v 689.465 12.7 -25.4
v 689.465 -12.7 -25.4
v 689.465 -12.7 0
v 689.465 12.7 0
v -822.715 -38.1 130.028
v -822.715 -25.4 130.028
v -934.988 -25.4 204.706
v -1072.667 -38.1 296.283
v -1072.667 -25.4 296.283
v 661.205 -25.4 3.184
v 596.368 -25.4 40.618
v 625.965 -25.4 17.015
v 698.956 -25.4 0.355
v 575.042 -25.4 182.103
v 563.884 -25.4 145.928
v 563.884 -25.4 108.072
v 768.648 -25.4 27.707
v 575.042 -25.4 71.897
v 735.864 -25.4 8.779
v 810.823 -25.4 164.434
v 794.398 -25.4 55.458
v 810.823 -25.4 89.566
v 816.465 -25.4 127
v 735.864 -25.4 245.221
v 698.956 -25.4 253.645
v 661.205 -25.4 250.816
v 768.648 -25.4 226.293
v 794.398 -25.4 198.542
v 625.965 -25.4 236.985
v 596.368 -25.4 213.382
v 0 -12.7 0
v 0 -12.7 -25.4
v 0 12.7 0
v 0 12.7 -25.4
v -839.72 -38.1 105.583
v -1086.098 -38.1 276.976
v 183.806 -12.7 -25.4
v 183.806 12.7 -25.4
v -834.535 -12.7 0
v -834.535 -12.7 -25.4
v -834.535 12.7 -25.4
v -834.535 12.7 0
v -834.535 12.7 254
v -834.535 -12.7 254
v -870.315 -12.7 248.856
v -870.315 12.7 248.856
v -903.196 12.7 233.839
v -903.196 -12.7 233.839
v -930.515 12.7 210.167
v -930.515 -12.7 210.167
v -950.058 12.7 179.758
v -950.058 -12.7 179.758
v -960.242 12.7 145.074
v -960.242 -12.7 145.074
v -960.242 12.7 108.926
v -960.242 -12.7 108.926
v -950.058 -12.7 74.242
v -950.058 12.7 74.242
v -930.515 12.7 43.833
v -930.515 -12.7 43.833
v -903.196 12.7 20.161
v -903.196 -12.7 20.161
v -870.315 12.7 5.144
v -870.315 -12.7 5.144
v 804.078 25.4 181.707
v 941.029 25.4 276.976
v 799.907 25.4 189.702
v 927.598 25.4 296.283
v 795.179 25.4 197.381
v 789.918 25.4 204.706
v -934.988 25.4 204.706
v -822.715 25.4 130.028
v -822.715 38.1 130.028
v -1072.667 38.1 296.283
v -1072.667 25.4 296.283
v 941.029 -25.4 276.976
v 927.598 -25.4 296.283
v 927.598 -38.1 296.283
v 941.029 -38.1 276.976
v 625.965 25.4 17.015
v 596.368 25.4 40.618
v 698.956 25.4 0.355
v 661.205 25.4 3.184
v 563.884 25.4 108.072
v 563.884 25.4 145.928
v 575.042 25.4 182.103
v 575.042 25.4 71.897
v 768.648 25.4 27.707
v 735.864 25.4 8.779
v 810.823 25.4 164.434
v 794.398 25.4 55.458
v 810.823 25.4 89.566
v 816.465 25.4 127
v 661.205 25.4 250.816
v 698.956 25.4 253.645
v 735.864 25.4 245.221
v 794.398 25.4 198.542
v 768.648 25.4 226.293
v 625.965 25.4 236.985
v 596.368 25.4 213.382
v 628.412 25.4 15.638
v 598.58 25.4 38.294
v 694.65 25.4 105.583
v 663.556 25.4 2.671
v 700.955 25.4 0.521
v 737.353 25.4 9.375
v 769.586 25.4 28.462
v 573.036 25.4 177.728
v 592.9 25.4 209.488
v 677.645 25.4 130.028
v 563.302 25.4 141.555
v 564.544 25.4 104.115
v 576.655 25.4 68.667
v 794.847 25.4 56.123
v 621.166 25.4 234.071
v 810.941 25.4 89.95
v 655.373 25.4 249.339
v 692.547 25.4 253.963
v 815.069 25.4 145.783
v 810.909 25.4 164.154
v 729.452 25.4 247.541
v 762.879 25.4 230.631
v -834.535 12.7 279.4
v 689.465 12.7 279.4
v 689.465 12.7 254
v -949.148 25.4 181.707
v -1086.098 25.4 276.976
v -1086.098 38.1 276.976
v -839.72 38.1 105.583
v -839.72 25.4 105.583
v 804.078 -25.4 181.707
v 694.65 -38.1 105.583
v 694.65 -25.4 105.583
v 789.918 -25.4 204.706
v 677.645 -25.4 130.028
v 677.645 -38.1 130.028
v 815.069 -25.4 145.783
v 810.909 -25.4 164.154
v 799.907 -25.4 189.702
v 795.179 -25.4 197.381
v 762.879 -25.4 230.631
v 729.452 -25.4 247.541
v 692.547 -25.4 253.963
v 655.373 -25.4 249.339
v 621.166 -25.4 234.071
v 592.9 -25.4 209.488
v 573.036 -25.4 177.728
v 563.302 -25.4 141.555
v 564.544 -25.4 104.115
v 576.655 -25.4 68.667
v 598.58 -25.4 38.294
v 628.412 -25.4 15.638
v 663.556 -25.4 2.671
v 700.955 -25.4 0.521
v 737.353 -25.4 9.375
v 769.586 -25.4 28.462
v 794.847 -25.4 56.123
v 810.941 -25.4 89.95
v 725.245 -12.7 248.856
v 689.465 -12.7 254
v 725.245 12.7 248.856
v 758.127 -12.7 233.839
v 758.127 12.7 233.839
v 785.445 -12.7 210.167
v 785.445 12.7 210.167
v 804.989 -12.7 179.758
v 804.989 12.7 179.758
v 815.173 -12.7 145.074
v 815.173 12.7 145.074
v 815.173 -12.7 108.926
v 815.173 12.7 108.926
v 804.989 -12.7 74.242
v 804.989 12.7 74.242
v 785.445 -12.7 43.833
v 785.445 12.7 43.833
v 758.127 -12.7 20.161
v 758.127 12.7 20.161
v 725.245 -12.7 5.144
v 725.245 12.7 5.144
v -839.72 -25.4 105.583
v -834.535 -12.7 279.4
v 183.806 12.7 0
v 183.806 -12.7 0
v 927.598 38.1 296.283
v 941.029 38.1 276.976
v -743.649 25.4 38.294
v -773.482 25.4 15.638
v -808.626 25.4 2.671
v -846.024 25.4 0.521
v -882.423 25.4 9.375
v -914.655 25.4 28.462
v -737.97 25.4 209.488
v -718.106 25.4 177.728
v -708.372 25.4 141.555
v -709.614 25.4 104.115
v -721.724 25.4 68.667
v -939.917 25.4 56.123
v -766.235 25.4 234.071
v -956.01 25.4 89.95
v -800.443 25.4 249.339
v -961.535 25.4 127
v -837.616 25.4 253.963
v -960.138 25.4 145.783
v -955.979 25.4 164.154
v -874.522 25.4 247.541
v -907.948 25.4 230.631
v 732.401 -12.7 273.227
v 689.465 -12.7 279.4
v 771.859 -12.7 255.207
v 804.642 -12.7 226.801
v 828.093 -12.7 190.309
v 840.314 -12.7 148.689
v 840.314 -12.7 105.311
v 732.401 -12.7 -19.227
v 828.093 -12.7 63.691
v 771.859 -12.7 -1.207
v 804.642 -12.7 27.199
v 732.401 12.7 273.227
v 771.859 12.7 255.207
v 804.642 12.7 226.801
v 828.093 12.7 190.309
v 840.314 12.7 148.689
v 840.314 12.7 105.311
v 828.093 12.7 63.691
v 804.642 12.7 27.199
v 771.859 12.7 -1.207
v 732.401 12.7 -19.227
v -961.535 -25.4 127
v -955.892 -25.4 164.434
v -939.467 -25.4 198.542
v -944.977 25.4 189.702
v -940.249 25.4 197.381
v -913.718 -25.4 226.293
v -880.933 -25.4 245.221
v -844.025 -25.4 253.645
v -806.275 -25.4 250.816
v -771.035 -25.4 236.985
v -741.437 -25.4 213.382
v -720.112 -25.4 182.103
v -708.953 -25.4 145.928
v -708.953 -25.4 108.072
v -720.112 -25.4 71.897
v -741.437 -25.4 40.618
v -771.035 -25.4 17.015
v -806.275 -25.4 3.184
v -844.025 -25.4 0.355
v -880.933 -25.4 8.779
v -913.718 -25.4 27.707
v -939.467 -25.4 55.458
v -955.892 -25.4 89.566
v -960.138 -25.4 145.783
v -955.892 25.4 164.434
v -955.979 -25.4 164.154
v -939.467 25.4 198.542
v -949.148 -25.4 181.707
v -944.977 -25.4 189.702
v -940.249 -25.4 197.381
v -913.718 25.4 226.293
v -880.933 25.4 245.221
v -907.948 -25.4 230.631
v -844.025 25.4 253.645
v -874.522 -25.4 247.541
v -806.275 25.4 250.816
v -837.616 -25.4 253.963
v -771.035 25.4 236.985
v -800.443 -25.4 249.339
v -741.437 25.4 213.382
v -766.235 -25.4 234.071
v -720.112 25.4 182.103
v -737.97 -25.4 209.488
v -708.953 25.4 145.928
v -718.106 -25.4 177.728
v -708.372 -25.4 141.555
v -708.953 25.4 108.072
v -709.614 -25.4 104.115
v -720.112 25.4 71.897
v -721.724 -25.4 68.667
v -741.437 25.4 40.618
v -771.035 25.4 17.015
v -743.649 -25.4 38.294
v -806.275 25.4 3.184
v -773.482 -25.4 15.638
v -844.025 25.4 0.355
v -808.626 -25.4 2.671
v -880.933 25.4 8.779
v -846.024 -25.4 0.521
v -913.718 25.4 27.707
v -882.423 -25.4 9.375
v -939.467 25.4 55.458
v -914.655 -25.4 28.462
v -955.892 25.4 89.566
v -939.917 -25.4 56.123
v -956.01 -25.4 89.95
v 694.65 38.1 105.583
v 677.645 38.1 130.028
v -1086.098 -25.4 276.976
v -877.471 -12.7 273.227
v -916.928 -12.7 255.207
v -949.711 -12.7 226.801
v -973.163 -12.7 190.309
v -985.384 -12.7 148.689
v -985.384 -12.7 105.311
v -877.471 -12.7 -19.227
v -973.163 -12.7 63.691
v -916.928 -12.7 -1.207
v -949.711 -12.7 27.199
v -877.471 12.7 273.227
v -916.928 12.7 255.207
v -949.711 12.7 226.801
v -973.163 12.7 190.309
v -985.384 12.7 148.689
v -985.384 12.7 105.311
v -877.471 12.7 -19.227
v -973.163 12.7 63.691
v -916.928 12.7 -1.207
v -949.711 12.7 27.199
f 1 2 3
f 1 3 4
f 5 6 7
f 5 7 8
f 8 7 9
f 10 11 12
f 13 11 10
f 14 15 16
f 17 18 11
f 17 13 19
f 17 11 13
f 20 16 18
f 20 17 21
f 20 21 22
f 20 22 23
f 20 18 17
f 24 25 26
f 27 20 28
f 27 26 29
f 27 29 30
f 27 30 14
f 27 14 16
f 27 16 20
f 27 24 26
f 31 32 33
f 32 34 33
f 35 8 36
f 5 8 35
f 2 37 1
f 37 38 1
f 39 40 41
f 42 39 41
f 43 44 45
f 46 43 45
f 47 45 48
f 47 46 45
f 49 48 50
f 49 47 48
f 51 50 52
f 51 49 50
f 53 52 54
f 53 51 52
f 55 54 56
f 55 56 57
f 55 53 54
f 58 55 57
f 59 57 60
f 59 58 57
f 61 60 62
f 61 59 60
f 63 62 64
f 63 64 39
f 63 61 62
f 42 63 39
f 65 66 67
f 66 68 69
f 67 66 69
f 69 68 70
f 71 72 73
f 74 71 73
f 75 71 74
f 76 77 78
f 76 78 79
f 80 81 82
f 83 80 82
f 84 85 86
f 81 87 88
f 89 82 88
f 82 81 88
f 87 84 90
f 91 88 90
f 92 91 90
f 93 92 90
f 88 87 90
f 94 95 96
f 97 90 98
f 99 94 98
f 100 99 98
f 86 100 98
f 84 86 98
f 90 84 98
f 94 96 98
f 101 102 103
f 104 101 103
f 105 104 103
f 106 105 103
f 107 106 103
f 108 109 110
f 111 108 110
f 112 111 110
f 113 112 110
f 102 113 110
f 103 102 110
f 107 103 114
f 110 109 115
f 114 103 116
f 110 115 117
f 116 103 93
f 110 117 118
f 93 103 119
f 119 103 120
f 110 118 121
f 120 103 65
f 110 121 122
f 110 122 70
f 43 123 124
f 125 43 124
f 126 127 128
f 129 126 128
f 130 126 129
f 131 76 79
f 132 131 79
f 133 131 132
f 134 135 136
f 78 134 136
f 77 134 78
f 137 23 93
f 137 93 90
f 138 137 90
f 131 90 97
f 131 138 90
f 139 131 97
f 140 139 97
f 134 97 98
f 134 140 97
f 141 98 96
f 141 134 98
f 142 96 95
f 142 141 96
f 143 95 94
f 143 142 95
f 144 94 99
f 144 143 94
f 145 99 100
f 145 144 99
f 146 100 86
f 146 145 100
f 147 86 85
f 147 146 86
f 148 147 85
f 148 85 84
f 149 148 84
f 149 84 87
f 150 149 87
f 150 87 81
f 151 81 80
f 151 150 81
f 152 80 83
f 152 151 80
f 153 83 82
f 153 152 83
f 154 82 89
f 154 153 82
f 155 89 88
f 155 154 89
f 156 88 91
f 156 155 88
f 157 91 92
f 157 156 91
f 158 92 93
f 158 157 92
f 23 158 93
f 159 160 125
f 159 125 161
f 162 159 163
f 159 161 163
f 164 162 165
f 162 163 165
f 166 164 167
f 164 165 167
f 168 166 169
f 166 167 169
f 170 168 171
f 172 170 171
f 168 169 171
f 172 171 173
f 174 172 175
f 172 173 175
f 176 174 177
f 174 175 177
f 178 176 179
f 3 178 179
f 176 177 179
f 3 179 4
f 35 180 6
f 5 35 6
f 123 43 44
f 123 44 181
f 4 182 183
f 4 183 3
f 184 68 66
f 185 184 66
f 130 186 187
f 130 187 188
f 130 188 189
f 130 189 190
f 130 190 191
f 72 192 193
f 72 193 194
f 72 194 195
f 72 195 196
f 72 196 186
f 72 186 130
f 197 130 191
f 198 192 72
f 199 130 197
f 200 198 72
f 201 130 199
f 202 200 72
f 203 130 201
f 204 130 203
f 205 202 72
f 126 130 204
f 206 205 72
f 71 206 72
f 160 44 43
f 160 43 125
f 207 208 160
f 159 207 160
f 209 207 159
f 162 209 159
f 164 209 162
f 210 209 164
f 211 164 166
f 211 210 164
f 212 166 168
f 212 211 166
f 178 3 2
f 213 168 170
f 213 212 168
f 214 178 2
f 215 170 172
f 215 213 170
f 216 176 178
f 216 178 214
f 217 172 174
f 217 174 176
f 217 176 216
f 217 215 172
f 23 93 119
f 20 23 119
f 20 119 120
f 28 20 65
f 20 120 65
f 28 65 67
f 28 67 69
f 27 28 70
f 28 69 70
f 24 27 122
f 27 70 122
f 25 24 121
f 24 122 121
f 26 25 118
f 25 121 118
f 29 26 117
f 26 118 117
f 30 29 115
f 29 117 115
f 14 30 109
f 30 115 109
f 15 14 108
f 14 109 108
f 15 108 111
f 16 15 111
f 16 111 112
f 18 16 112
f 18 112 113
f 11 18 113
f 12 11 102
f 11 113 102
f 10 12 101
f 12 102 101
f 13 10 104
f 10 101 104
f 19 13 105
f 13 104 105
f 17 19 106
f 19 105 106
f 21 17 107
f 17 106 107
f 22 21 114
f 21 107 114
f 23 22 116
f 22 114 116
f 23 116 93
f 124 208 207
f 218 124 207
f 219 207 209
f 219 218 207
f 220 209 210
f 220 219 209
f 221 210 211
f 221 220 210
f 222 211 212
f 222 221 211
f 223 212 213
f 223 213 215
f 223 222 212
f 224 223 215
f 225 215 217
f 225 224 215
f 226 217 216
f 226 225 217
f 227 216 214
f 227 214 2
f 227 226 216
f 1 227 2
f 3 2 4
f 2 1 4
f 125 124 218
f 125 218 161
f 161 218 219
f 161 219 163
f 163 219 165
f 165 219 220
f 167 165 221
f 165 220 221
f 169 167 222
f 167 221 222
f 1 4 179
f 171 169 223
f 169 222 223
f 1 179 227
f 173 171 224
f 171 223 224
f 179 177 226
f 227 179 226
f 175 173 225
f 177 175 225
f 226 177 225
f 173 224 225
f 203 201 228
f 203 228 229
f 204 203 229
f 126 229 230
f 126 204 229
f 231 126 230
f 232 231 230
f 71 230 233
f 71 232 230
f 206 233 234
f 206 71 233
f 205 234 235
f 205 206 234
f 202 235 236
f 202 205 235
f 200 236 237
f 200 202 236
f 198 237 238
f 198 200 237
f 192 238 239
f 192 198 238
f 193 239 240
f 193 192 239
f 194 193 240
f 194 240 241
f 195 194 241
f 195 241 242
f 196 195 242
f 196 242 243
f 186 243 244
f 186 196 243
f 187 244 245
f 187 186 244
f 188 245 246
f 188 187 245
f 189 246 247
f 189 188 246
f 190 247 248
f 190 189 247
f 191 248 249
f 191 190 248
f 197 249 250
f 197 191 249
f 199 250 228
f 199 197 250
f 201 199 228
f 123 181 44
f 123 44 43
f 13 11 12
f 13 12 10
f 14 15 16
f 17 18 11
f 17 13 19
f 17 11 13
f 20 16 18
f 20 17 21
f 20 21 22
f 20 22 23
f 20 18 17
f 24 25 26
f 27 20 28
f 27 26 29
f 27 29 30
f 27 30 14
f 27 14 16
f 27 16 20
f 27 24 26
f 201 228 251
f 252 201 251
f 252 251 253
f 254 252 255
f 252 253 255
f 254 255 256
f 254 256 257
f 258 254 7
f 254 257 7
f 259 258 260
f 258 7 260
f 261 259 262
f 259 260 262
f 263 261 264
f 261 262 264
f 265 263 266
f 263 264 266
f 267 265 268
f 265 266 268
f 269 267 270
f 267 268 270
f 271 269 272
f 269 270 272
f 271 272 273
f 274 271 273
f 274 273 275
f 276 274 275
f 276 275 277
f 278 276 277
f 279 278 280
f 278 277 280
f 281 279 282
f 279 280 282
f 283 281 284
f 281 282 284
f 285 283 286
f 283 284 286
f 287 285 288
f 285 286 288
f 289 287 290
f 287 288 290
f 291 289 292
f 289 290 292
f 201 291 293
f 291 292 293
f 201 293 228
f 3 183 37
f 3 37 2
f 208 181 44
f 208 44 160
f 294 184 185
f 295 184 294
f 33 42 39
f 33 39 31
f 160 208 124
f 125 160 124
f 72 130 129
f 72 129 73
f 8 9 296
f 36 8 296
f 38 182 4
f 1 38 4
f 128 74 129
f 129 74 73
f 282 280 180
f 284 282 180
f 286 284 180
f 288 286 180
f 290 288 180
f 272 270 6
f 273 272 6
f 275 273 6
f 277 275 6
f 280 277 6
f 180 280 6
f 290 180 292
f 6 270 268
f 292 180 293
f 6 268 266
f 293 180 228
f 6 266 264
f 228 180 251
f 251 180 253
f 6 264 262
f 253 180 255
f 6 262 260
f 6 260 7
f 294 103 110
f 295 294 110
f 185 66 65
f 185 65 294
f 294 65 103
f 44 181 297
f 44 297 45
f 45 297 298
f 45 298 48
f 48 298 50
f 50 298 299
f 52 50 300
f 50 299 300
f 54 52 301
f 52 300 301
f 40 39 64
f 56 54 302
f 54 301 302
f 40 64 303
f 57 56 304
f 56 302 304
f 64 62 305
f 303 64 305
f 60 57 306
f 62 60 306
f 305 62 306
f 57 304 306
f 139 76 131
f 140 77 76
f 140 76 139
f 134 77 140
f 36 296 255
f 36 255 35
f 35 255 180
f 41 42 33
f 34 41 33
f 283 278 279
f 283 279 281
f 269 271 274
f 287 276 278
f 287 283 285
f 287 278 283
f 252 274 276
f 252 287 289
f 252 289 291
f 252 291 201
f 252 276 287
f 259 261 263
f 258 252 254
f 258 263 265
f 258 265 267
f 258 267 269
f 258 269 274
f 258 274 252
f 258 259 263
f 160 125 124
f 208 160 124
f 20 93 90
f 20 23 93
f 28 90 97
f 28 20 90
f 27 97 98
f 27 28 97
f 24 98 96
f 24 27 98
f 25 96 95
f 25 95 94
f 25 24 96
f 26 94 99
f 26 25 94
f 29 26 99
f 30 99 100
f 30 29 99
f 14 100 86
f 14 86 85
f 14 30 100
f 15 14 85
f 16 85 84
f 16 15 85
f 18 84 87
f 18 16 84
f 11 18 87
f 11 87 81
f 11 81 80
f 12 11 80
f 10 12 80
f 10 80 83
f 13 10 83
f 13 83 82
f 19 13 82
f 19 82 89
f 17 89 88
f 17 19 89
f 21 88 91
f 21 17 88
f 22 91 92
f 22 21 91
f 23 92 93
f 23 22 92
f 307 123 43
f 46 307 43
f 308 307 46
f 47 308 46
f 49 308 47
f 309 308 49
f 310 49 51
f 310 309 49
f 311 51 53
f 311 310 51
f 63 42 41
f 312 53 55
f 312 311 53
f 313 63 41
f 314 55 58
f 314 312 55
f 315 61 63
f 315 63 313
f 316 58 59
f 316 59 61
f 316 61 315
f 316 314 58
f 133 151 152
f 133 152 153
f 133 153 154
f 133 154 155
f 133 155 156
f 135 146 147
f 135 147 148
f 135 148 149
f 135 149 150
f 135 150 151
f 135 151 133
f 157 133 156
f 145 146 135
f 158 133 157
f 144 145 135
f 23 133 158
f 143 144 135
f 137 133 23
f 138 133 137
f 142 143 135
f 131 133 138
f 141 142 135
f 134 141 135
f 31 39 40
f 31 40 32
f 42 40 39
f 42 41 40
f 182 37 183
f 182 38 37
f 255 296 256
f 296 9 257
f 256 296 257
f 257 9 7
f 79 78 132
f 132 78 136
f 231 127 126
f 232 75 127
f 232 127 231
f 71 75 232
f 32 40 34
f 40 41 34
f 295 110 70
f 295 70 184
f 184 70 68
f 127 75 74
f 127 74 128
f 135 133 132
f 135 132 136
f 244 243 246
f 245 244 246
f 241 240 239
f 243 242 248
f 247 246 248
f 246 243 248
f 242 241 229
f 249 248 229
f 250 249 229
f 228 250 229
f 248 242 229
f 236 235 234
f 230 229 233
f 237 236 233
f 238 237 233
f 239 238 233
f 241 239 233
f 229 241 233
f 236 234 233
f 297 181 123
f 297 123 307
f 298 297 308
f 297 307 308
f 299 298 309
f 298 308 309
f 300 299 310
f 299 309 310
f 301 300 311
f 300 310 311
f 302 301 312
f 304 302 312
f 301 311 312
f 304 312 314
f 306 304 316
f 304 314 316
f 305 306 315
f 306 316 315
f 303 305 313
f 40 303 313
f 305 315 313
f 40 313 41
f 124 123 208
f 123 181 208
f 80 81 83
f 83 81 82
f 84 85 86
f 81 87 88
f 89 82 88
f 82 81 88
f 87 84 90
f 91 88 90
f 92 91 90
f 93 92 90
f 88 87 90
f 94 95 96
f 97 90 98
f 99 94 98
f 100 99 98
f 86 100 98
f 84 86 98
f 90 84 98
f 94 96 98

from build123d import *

# Parameters (mm, degrees)
F0_W     = 834.534724
F0_H     = 25.4
F0_W_2   = 505.659487
F0_W_3   = 1524
F1_DEPTH = 12.7
F2_R     = 127
F3_DEPTH = 25.4
F4_W     = 25.4
F4_H     = 25.4
F5_ANGLE = 180
F9_DEPTH = 12.7


with BuildPart() as f1:
    # F0 (on Front) → F1 (new body, symmetric)
    with BuildSketch(Plane.XZ):
        with Locations((-417.267362, -12.7)):
            Rectangle(F0_W, F0_H)
        with Locations((436.635533, -12.7)):
            Rectangle(F0_W_2, F0_H)
        with Locations((-72.534724, 266.7)):
            Rectangle(F0_W_3, F0_H)
    extrude(amount=F1_DEPTH, both=True)


with BuildPart() as f3:
    # F2 (on Front) → F3 (new body, symmetric)
    with BuildSketch(Plane.XZ):
        with Locations((689.465276, 127)):
            Circle(F2_R)
    extrude(amount=F3_DEPTH, both=True)


with BuildPart() as f5:
    # F4 (on face) → F5 (revolve)
    with BuildSketch(Plane.YZ.offset(689.465276)):
        with Locations((0, 266.7)):
            Rectangle(F4_W, F4_H)
    revolve(axis=Axis((689.465276, 5.172679, 127), (0, 1, 0)), revolution_arc=F5_ANGLE)


with BuildPart() as f7_1:
    # F7: instance of F3
    add(f3.part.mirror(Plane(origin=(-72.534724, 0, 266.7), x_dir=(0, -1, 0), z_dir=(-1, 0, 0))))

    # F8 (on face) → F9 (join)
    with BuildSketch(Plane.XZ.offset(25.4)):
        Polygon((-839.719892, 105.583042), (-822.714865, 130.027801), (-1072.667397, 296.283301), (-1086.098239, 276.97644), align=None)
    extrude(amount=F9_DEPTH)


with BuildPart() as f7_2:
    # F7: instance of F5
    add(f5.part.mirror(Plane(origin=(-72.534724, 0, 266.7), x_dir=(0, -1, 0), z_dir=(-1, 0, 0))))


with BuildPart() as f10_1:
    # F10: instance of F7_1
    add(f7_1.part.mirror(Plane.XZ))


with BuildPart() as f11_1:
    # F11: instance of F7_1
    add(f7_1.part.mirror(Plane(origin=(-72.534724, 0, 266.7), x_dir=(0, -1, 0), z_dir=(-1, 0, 0))))


with BuildPart() as f11_2:
    # F11: instance of F10_1
    add(f10_1.part.mirror(Plane(origin=(-72.534724, 0, 266.7), x_dir=(0, -1, 0), z_dir=(-1, 0, 0))))


solid = Compound([f1.part, f3.part, f5.part, f7_1.part, f7_2.part, f10_1.part, f11_1.part, f11_2.part])
